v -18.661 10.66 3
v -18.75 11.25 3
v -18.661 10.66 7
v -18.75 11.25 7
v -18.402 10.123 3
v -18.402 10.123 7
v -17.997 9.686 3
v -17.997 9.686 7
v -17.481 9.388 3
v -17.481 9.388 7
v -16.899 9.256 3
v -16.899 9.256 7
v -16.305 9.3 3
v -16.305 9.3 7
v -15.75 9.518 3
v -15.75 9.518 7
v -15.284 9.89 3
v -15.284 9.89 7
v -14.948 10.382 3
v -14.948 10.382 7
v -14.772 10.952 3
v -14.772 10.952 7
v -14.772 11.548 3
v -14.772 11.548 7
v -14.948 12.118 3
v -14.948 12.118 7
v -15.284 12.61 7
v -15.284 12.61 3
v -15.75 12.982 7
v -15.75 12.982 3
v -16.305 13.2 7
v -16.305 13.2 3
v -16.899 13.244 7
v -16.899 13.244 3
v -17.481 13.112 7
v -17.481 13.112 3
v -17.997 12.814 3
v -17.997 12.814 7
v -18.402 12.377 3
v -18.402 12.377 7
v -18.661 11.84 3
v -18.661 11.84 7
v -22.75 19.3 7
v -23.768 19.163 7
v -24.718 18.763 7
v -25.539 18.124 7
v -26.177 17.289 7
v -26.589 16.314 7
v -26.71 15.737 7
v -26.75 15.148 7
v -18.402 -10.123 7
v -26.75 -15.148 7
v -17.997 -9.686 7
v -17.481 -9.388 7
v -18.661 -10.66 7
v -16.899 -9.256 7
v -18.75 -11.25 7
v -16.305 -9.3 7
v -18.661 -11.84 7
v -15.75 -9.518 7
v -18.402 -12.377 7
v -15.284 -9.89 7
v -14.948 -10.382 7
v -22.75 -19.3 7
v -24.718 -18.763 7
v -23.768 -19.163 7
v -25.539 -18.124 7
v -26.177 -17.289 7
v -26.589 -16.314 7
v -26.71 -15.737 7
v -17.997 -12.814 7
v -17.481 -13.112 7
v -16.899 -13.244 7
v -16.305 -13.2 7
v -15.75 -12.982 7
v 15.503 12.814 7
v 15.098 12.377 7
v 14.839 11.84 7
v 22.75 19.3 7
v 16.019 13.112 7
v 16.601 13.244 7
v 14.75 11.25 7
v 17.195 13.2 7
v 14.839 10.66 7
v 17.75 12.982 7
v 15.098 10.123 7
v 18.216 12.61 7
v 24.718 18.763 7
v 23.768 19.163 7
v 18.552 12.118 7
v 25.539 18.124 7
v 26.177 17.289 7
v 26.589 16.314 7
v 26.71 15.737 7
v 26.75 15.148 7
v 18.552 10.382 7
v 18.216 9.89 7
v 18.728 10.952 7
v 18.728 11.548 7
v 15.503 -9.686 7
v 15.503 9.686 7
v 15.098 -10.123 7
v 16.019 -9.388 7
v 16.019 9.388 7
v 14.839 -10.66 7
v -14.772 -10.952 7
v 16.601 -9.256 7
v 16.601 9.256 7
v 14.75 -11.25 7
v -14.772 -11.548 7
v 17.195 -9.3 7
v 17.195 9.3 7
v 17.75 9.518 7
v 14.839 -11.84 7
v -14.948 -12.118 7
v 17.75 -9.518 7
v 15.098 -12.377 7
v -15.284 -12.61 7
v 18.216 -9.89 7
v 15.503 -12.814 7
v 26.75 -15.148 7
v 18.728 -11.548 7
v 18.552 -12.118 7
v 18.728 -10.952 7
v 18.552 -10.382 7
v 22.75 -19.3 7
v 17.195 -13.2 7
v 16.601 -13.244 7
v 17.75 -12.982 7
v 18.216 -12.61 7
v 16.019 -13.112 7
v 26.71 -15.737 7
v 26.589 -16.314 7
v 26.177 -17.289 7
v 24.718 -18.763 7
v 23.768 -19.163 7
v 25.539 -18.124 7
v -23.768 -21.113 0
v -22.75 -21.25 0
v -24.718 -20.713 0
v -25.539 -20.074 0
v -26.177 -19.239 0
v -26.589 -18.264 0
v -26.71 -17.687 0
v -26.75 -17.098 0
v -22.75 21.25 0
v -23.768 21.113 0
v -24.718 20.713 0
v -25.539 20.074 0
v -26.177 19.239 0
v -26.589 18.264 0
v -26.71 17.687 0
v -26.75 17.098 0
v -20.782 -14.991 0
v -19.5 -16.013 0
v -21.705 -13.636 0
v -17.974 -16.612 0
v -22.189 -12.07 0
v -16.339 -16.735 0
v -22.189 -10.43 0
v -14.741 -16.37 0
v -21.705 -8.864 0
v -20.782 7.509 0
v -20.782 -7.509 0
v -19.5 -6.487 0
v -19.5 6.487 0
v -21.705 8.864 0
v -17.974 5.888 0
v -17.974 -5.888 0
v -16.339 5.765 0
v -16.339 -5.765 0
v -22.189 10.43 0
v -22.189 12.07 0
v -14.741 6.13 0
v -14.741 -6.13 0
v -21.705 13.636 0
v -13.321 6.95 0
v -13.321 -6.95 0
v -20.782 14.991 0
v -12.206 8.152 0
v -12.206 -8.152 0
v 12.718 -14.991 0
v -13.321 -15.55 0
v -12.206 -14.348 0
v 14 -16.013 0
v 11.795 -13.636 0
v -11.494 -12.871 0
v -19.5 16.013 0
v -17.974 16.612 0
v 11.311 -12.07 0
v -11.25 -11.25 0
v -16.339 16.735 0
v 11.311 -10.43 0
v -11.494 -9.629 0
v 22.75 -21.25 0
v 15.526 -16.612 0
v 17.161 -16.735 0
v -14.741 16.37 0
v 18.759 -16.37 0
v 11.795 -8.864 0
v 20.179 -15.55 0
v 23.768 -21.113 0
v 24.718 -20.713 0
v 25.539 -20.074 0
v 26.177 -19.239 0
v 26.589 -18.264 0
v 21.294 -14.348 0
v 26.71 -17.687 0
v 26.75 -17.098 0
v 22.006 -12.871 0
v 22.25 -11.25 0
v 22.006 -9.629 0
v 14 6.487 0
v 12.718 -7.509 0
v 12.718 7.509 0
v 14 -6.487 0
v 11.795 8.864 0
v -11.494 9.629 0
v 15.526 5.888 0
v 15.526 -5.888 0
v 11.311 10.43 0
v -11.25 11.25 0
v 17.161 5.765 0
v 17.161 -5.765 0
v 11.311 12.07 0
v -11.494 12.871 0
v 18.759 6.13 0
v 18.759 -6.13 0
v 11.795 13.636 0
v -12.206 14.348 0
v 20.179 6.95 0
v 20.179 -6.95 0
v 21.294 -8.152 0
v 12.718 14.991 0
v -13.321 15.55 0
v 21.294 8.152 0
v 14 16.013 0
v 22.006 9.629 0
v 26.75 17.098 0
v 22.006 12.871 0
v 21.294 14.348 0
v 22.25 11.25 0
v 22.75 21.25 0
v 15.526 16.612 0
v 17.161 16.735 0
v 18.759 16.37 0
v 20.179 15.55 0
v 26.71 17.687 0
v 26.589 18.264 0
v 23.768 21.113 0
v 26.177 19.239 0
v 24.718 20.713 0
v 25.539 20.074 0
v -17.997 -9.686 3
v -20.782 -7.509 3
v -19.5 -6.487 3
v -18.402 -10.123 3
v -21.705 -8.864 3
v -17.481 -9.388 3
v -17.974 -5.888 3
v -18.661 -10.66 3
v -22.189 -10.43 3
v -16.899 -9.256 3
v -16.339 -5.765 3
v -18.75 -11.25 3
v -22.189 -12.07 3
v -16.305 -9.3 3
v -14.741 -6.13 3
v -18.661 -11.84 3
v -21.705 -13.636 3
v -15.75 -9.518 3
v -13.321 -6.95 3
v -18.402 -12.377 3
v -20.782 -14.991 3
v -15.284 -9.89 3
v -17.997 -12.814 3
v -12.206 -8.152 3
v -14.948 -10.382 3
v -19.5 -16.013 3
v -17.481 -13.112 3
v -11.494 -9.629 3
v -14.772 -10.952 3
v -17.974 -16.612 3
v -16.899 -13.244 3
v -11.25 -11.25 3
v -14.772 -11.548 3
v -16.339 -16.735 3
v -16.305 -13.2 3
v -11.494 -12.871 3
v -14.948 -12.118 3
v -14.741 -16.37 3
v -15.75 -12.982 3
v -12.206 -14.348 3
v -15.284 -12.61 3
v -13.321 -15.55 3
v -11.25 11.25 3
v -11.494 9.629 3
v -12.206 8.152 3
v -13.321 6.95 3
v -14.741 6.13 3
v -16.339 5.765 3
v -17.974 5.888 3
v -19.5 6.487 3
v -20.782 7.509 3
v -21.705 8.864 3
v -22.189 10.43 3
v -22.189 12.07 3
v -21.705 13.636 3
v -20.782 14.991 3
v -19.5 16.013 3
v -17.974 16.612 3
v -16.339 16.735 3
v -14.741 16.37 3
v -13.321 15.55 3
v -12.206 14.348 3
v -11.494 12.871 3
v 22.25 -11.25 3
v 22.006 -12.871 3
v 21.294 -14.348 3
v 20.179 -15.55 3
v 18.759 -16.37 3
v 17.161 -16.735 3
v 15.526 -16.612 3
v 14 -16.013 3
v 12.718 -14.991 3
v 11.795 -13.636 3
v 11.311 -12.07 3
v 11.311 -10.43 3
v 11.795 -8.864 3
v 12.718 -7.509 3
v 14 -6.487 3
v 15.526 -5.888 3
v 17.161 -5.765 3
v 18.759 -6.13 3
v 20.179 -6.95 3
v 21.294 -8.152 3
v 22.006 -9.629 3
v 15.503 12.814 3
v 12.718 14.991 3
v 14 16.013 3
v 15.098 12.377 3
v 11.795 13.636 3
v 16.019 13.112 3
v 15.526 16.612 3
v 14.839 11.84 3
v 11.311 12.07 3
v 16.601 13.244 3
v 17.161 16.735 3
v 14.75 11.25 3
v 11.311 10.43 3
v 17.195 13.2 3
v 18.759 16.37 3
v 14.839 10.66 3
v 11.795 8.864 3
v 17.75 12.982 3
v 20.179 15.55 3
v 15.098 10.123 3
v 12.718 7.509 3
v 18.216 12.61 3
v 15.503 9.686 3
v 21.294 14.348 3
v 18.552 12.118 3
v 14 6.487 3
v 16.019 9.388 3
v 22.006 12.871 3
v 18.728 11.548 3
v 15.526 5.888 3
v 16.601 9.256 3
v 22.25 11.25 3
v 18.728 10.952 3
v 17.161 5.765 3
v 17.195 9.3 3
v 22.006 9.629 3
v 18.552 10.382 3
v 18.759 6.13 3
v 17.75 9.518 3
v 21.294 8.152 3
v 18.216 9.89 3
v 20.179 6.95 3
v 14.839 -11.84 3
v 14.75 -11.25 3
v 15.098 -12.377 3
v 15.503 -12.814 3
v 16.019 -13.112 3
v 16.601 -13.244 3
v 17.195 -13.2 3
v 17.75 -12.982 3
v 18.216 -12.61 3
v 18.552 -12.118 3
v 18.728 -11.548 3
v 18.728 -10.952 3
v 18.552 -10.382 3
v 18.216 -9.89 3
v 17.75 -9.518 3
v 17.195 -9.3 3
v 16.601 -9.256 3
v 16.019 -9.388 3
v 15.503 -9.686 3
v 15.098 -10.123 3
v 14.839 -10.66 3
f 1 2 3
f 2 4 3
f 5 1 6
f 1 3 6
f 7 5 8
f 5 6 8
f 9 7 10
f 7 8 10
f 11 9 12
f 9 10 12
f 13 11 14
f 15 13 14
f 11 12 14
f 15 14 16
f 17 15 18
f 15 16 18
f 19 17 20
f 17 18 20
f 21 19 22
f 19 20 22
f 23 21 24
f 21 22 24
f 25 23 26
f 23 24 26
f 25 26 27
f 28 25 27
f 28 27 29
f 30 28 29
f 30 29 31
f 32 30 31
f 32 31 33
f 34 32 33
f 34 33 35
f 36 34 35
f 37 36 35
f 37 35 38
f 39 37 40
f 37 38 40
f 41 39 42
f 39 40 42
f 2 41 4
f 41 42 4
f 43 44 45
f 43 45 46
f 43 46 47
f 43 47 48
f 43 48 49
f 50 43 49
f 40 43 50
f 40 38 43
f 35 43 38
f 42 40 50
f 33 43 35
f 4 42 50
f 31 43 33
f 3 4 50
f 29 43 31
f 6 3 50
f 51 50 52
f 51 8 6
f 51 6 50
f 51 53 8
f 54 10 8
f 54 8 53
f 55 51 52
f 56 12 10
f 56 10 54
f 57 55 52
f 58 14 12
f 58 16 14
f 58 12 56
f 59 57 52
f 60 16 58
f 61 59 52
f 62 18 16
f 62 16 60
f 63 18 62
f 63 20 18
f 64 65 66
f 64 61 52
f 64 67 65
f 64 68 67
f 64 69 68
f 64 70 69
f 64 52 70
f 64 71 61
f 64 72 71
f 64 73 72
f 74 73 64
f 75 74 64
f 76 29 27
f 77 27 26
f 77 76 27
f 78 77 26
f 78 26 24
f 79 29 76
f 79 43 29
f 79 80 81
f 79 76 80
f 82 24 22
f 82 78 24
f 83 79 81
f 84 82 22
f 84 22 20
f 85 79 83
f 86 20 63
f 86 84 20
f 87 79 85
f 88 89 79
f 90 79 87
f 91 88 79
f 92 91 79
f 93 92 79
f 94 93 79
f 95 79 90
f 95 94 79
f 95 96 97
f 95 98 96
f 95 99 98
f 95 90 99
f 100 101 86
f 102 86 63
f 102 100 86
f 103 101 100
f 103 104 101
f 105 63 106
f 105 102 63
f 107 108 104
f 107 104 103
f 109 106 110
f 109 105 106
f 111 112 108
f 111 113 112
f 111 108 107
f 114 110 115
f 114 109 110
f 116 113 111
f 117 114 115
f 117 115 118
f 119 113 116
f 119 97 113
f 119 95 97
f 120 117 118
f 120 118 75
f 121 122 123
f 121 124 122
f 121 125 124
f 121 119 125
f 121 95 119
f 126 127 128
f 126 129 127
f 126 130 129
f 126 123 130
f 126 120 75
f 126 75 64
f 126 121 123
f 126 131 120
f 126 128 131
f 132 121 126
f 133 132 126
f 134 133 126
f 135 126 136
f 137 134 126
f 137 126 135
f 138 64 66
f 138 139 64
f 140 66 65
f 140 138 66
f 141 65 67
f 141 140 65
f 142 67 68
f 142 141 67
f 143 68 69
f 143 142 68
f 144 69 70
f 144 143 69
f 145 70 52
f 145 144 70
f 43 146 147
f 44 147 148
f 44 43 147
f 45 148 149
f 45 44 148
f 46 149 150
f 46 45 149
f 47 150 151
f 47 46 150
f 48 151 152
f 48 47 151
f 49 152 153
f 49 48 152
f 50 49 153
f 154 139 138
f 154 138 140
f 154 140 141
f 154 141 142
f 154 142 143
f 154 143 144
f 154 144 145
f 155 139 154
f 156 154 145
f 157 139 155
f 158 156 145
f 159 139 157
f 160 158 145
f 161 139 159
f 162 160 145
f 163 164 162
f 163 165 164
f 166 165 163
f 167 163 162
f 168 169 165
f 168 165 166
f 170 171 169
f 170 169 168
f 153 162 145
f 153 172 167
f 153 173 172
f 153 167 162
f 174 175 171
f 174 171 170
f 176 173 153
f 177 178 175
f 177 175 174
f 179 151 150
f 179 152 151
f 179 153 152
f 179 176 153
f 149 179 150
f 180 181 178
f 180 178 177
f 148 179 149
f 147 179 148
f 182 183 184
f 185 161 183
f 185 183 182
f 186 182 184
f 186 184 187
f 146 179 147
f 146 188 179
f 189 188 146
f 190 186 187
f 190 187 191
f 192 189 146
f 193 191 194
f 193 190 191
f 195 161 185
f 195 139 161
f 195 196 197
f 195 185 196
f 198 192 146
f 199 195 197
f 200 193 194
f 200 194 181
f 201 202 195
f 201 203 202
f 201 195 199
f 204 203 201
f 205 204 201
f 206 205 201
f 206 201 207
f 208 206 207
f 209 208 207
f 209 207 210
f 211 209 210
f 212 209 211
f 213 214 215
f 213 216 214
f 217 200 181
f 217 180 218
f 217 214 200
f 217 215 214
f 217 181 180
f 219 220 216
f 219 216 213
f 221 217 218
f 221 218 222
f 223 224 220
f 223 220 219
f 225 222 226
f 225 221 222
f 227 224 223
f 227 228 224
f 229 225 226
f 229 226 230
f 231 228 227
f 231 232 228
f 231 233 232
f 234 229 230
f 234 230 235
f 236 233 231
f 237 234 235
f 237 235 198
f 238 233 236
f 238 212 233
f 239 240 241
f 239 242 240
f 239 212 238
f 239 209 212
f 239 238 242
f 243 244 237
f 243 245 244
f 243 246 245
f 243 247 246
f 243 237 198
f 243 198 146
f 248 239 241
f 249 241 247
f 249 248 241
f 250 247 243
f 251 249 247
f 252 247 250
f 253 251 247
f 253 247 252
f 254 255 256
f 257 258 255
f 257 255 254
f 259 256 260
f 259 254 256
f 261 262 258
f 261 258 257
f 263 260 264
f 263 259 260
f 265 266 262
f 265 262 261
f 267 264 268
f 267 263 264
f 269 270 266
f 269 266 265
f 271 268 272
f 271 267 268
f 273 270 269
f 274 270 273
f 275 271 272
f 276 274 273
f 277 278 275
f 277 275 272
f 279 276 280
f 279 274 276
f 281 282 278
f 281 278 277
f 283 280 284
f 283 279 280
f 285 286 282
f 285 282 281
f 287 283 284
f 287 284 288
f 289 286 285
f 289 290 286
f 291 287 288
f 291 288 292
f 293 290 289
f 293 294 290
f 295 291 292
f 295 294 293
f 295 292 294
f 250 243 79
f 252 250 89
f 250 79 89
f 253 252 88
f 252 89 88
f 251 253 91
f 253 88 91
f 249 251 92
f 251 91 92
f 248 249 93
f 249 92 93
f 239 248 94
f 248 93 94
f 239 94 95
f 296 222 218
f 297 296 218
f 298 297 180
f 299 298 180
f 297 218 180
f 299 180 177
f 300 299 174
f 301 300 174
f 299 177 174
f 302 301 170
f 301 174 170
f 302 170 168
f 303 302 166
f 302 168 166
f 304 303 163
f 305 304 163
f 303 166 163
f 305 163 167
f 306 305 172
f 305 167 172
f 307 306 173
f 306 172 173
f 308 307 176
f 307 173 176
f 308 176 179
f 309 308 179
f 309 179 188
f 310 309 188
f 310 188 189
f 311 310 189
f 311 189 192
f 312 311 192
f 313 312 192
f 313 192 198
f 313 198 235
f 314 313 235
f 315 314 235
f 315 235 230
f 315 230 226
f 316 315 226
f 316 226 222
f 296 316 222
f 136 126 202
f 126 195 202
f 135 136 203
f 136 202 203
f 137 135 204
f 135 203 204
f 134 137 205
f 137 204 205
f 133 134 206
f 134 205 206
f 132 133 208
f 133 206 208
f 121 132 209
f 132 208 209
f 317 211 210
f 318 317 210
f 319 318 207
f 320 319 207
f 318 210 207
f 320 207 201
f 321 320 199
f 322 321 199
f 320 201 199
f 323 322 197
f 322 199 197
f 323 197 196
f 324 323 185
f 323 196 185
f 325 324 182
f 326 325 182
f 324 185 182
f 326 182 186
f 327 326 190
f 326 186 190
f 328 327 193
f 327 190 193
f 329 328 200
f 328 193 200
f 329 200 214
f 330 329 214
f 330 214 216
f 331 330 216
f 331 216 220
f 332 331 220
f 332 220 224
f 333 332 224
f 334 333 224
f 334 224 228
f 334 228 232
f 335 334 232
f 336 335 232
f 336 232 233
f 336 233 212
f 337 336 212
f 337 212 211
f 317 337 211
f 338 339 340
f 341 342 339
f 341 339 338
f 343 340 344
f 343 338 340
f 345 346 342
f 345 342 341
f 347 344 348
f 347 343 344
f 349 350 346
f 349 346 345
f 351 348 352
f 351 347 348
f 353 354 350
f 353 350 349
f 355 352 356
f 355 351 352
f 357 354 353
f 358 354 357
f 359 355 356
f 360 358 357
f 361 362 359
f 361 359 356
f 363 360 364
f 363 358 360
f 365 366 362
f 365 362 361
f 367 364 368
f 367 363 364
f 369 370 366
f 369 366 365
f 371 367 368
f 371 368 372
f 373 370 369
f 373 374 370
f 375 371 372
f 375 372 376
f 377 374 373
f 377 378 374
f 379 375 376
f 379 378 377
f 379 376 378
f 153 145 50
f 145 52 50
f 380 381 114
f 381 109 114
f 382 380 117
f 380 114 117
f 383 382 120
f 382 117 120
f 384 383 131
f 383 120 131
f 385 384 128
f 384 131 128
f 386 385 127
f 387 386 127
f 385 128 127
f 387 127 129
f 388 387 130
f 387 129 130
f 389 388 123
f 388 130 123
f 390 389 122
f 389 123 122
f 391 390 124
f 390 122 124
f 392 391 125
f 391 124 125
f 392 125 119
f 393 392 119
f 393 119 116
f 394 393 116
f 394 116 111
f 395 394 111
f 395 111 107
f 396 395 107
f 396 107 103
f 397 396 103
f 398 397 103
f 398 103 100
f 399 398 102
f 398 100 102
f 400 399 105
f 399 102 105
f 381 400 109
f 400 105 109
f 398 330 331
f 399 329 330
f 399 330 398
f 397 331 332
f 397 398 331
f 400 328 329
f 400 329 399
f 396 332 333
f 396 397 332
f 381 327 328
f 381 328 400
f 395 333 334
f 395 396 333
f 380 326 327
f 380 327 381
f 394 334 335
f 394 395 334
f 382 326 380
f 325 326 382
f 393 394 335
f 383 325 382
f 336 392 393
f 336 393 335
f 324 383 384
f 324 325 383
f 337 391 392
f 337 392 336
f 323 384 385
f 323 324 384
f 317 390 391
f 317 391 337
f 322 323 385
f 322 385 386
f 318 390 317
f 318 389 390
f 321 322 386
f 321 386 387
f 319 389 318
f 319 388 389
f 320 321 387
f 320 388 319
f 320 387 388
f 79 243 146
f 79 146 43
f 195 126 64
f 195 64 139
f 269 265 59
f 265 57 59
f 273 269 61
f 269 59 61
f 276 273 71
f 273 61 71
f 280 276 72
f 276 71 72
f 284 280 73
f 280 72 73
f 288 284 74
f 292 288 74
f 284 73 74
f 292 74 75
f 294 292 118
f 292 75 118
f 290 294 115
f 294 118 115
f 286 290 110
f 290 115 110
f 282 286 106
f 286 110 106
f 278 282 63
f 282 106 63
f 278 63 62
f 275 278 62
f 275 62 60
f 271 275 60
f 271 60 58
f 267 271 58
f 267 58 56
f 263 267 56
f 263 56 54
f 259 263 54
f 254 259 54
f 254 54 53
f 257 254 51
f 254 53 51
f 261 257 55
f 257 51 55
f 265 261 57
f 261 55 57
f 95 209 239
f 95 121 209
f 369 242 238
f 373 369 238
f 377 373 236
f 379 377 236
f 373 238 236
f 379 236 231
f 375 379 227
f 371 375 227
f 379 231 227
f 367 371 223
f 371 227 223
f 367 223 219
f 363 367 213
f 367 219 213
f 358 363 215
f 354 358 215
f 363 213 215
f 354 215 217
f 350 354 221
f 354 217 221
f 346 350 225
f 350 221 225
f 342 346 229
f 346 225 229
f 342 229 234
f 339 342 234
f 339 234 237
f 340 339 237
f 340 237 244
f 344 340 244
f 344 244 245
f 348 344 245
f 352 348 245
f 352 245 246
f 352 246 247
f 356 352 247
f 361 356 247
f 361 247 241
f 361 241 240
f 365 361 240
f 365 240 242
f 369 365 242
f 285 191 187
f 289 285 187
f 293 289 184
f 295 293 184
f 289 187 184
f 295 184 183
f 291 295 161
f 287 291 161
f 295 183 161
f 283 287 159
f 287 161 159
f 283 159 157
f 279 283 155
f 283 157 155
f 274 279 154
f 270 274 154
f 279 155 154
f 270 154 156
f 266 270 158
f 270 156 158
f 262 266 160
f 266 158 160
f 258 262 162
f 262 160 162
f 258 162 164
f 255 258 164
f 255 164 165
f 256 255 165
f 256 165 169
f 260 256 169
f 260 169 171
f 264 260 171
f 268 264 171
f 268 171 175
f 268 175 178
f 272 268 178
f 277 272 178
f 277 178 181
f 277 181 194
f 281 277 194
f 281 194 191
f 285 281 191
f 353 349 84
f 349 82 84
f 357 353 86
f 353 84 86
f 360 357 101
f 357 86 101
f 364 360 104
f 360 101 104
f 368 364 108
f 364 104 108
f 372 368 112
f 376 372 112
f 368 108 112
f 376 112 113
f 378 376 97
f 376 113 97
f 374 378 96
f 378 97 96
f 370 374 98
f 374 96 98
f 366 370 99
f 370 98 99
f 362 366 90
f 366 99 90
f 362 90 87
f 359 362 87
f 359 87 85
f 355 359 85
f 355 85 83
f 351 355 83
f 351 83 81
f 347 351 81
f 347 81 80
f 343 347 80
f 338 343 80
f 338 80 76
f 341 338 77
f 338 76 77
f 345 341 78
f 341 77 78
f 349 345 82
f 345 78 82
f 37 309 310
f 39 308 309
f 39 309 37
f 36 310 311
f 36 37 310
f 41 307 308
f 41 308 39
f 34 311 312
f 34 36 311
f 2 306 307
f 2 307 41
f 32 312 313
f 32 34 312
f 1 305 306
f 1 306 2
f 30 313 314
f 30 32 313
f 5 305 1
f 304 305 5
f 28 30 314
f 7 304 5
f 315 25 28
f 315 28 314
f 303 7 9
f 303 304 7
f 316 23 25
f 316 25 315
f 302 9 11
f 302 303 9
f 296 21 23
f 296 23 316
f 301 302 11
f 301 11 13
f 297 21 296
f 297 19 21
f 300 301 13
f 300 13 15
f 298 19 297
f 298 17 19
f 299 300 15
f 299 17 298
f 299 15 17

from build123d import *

# Parameters (mm, degrees)
F2_DEPTH       = 26.75
F3_R           = 4
F5_D           = 4
F5_DEPTH       = 14.1
F5_CBORE_D     = 11
F5_CBORE_DEPTH = 3
F5_TIP         = 1.2017212381


with BuildPart() as f2:
    # F1 (on Right) → F2 (new body, symmetric)
    with BuildSketch(Plane.YZ):
        Polygon((-19.3, 7), (-21.25, 0), (21.25, 0), (19.3, 7), align=None)
    extrude(amount=F2_DEPTH, both=True)

    # F3
    f3_edges = [f2.edges().sort_by_distance(p)[0] for p in [
        (-26.75, -20.275, 3.5),
        (26.75, -20.275, 3.5),
        (26.75, 20.275, 3.5),
        (-26.75, 20.275, 3.5),
    ]]
    fillet(f3_edges, radius=F3_R)

    # F5
    with Locations(Plane(origin=(0, 0, 0), x_dir=(1, 0, 0), z_dir=(0, 0, -1))):
        with Locations((-16.75, 11.25), (16.75, 11.25), (16.75, -11.25), (-16.75, -11.25)):
            CounterBoreHole(F5_D / 2, F5_CBORE_D / 2, F5_CBORE_DEPTH, depth=F5_DEPTH)
            with Locations((0, 0, -(F5_DEPTH + F5_TIP / 2))):  # 118° drill point
                Cone(0, F5_D / 2, F5_TIP, mode=Mode.SUBTRACT)


solid = f2.part
